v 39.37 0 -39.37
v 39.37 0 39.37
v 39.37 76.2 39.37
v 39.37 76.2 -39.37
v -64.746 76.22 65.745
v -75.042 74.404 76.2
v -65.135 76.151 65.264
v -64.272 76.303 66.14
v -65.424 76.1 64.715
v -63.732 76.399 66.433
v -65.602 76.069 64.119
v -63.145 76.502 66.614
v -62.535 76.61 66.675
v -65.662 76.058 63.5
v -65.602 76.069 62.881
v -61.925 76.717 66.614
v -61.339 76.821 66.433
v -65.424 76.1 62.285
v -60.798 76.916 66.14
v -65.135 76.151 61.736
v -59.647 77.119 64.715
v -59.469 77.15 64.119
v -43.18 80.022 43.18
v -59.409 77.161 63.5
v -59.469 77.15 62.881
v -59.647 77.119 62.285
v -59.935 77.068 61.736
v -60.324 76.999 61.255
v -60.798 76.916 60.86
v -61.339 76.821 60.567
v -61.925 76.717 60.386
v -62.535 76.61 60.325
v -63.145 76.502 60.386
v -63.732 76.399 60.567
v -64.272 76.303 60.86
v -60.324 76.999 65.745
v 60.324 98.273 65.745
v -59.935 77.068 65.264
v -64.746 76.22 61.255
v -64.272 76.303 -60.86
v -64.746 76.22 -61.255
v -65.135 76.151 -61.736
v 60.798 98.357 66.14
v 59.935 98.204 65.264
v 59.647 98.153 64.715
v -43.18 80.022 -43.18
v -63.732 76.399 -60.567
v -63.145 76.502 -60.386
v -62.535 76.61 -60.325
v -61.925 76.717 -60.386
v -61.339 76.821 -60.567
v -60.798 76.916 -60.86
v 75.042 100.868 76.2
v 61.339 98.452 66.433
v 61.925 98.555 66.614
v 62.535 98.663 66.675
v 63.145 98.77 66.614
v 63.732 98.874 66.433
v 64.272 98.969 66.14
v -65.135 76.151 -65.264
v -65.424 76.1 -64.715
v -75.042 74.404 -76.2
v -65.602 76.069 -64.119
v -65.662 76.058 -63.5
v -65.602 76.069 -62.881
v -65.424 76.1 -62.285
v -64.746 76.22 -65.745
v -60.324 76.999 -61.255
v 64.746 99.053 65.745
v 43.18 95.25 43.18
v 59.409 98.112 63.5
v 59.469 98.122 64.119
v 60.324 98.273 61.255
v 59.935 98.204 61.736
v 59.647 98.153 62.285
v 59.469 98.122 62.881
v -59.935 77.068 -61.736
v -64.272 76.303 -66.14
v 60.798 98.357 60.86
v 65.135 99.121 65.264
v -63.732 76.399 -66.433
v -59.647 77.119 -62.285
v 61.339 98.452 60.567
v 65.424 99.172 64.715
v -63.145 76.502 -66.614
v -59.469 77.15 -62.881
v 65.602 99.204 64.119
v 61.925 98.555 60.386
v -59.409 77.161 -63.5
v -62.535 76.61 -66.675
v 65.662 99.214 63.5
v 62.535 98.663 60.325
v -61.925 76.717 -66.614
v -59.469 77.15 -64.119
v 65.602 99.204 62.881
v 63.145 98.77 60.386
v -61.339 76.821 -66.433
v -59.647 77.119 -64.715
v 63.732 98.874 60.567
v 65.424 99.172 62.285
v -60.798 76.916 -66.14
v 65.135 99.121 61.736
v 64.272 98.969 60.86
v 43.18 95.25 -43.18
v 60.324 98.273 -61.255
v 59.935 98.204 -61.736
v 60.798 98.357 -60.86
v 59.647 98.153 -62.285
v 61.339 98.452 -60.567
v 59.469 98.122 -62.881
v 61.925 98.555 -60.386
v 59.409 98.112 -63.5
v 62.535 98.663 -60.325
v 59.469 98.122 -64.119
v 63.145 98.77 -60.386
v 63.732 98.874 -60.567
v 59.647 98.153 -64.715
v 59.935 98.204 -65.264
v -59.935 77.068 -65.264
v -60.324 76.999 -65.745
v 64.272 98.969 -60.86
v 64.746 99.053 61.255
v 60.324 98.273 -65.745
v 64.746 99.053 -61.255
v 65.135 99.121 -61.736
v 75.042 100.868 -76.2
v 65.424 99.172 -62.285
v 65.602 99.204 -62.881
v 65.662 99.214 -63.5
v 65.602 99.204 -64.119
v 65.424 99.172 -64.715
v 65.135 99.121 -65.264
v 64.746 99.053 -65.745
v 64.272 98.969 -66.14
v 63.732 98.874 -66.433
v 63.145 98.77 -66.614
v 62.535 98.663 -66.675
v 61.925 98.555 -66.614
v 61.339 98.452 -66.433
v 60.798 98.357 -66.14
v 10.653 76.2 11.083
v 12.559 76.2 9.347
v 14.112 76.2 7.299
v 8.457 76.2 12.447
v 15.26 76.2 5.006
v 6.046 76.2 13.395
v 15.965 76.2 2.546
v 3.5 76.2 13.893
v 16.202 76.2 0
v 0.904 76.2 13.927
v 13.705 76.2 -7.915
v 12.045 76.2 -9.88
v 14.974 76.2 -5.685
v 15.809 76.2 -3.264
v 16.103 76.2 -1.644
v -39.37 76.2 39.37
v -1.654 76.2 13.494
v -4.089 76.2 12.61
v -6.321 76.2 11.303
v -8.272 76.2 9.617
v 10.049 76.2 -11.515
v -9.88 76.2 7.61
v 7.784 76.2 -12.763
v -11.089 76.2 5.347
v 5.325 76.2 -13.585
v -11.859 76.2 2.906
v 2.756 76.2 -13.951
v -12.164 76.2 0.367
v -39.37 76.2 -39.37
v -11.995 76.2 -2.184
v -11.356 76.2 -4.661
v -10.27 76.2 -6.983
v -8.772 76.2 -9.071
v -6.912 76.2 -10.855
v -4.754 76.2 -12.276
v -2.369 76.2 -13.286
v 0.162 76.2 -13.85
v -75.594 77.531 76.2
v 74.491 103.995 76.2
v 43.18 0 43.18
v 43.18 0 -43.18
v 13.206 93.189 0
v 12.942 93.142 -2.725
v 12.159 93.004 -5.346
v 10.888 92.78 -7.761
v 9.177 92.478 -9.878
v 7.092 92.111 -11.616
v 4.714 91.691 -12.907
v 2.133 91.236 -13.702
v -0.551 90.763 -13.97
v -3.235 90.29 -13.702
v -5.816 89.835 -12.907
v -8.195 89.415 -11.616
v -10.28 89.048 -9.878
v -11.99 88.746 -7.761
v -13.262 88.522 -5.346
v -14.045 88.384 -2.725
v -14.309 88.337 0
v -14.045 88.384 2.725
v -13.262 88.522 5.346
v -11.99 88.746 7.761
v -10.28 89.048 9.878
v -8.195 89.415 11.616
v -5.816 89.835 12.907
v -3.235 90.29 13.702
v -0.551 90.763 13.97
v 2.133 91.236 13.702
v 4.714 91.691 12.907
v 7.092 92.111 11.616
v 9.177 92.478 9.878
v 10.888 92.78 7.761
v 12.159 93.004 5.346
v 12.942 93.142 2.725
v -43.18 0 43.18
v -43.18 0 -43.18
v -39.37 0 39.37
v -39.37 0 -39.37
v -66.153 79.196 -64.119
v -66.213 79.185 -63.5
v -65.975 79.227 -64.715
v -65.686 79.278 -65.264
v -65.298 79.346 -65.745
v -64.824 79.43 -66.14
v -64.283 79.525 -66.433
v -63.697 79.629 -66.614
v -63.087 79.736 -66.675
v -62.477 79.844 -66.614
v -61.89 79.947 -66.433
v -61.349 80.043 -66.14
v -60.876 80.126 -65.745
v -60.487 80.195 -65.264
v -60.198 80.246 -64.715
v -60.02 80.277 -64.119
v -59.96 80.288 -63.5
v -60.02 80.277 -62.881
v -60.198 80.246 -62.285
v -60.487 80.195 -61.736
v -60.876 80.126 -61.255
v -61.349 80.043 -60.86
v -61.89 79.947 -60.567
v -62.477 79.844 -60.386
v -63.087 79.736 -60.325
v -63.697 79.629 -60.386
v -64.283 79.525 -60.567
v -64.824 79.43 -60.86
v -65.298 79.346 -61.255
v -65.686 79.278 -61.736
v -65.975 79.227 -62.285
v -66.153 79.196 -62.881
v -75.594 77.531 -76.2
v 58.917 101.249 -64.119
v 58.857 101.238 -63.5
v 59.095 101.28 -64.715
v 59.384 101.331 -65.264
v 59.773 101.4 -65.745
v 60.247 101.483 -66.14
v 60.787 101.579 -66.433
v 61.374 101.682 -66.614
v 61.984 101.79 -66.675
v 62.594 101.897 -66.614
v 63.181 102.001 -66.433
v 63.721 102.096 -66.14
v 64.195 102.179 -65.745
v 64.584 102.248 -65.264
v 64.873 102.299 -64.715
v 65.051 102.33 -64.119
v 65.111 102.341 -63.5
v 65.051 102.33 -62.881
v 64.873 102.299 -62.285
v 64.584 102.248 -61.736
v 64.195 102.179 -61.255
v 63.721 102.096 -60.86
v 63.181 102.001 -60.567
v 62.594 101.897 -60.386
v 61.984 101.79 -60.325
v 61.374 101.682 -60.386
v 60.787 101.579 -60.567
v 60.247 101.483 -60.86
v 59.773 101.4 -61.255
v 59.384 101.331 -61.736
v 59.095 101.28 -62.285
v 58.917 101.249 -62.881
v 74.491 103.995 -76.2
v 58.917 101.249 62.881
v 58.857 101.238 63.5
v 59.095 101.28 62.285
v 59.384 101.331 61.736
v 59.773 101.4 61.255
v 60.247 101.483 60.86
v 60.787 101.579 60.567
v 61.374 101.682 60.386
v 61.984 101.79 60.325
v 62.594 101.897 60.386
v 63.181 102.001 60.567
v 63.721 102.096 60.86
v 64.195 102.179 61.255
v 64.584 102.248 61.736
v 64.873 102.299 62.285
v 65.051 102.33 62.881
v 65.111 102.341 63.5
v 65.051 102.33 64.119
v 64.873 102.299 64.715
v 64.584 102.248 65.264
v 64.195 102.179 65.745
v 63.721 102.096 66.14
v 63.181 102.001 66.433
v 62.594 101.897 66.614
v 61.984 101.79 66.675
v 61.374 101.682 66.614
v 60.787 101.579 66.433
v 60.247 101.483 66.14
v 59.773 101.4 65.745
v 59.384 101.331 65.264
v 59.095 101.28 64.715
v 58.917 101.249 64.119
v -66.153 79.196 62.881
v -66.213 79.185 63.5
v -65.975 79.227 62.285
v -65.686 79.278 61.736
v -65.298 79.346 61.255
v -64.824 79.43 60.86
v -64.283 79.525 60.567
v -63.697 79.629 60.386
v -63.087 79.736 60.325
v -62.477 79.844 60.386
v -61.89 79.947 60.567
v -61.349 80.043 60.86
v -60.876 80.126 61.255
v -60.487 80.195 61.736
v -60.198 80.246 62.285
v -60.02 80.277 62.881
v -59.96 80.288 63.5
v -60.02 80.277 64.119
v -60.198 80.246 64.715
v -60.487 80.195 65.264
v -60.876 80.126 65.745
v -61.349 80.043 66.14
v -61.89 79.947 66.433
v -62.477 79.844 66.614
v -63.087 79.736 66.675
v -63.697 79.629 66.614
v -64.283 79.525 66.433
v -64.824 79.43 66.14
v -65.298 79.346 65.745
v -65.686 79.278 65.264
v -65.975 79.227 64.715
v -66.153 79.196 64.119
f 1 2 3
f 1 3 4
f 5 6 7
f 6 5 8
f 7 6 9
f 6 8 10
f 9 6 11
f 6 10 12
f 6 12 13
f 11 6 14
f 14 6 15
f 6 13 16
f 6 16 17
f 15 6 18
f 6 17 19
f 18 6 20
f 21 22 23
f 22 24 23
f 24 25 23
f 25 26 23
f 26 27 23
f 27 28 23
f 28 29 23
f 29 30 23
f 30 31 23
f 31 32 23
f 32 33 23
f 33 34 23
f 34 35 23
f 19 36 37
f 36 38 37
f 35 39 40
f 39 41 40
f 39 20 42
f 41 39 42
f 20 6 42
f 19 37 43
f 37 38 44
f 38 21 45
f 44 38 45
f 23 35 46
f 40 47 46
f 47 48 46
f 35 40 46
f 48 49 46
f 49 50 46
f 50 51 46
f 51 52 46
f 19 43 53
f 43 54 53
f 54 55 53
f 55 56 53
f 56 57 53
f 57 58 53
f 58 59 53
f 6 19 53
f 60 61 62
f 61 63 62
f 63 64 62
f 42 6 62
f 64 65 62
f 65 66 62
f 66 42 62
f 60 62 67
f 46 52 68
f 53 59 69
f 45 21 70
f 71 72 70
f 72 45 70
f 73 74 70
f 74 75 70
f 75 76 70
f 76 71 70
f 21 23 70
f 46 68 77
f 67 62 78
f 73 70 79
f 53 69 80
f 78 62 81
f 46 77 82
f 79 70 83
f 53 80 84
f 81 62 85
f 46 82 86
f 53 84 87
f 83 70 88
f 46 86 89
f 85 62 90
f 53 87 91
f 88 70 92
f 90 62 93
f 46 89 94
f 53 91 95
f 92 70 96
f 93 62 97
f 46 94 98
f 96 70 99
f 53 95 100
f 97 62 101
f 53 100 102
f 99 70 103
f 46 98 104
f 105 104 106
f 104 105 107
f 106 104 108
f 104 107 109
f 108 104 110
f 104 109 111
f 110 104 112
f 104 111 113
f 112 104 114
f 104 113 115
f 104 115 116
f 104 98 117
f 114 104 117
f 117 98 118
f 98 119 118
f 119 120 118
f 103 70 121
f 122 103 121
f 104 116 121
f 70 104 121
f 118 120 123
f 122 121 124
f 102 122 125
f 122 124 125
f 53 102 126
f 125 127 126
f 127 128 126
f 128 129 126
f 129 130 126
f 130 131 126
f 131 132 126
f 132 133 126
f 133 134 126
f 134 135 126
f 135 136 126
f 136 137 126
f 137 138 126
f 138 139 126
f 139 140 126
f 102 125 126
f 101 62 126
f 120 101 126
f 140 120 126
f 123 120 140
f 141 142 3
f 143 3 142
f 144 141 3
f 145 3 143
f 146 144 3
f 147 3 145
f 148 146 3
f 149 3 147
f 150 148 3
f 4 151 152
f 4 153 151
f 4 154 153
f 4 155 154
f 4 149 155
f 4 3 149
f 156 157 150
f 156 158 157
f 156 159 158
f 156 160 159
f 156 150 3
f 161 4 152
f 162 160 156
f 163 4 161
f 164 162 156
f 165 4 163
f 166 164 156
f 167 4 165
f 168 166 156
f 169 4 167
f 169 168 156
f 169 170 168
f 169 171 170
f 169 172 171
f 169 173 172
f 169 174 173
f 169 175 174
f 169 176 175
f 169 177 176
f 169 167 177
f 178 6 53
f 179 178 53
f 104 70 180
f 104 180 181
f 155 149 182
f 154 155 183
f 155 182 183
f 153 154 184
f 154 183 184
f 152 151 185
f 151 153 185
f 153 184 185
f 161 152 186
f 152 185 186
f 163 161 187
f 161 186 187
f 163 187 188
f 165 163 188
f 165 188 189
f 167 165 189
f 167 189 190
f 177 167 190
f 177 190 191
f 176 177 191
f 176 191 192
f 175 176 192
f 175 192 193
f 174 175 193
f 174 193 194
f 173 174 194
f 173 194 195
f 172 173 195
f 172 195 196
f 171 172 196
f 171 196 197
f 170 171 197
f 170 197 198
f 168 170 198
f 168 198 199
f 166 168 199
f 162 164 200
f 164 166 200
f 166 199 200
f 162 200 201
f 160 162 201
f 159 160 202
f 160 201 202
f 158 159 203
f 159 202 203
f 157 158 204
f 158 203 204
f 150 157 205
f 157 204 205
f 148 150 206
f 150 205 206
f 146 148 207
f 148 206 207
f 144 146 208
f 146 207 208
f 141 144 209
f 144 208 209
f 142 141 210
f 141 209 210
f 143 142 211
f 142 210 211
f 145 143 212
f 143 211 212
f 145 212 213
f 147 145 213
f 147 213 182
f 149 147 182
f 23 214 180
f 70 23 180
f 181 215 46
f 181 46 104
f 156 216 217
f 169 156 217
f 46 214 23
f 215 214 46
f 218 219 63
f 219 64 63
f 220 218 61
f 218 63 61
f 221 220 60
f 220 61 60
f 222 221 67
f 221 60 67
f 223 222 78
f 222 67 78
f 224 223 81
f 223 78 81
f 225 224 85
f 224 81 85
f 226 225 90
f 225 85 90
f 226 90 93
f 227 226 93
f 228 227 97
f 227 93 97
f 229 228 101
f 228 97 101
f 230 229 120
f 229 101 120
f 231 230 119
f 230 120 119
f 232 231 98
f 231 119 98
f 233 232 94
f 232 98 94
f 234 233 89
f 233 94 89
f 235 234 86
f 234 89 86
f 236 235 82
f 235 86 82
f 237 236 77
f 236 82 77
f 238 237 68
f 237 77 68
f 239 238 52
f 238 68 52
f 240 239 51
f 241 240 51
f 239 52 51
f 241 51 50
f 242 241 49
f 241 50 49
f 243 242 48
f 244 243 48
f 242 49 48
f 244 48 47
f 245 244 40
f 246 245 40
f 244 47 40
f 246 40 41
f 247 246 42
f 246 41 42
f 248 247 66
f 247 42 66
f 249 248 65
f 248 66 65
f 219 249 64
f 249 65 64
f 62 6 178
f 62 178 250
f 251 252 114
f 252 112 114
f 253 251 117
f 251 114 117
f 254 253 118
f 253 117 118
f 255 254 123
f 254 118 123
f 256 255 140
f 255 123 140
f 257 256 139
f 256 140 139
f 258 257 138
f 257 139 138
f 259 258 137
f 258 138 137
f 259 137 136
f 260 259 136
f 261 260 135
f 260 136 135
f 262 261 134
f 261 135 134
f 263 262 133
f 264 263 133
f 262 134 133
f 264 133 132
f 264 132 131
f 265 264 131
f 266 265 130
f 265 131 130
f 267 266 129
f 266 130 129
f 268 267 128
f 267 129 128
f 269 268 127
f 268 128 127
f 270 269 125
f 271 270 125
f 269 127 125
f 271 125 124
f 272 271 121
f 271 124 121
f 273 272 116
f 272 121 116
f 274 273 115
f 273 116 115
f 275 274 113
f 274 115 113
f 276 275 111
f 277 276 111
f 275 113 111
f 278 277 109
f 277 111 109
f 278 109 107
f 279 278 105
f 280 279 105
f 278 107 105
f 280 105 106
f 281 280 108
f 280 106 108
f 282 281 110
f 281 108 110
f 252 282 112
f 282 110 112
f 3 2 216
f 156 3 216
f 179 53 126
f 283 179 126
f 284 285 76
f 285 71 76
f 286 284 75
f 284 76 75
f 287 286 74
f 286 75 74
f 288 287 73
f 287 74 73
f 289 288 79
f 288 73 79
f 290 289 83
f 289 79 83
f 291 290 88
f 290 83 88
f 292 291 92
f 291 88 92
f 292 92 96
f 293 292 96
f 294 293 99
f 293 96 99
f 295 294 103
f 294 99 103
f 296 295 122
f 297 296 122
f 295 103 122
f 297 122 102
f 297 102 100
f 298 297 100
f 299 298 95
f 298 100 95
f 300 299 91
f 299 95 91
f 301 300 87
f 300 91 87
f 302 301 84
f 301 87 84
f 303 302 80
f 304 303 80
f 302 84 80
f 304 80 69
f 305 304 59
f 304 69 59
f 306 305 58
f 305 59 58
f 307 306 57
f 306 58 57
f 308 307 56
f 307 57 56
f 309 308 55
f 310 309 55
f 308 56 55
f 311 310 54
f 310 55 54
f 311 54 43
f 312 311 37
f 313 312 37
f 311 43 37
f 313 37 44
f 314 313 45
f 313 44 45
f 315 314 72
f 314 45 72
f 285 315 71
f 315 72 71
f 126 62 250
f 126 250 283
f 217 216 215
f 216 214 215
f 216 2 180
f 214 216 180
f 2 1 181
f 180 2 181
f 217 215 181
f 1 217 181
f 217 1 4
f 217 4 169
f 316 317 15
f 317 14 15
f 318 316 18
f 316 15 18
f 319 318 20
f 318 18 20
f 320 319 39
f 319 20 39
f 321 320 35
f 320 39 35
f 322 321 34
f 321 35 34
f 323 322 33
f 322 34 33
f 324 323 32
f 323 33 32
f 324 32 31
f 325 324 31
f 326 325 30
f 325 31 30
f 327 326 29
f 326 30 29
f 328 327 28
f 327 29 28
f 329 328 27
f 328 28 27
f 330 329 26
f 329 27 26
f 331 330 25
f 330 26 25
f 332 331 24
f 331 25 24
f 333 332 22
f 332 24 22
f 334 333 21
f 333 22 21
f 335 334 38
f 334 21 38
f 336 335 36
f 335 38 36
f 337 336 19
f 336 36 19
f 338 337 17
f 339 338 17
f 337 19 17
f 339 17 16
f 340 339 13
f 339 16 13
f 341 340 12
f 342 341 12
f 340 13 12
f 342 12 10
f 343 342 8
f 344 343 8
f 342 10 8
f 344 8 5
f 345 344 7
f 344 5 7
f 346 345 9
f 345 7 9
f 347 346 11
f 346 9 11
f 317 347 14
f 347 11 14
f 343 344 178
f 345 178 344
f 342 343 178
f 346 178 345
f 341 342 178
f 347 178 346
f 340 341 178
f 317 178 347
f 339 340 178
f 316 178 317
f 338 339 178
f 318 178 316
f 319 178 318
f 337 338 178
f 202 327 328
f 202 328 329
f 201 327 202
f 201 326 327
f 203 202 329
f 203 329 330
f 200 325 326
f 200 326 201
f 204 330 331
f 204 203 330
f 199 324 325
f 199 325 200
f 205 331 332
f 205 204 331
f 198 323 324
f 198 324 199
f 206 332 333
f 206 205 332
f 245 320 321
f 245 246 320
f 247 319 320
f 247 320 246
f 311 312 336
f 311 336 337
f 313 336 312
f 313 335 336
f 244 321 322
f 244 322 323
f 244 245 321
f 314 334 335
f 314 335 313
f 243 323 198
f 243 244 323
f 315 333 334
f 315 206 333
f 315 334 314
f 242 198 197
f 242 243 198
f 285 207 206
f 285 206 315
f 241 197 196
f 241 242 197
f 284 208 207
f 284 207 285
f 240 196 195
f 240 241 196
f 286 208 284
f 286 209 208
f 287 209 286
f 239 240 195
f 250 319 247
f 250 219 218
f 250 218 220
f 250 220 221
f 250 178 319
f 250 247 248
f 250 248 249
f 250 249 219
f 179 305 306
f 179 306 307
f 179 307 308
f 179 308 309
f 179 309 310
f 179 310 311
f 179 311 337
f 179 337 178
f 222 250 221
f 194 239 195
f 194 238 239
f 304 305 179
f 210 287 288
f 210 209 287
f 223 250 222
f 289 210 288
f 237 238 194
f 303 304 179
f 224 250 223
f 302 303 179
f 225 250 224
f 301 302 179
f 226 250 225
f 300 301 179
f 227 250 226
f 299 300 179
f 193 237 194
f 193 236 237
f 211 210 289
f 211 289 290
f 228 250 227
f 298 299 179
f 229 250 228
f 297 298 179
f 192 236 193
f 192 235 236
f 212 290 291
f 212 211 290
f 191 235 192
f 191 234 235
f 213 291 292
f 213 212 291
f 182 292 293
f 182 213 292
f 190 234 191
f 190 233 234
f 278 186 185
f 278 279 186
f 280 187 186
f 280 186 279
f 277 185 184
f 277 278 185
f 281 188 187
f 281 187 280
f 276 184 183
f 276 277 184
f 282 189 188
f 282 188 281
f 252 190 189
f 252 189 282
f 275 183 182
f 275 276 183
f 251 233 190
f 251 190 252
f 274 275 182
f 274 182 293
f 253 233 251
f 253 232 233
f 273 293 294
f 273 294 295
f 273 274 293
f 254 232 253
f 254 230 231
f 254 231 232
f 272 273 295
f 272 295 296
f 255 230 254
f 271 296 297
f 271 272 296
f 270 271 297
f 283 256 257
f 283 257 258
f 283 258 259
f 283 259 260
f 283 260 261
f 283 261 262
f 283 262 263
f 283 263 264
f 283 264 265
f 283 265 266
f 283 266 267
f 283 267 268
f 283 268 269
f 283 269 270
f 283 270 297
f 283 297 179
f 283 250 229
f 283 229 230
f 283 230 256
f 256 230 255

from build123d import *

# Parameters (mm, degrees)
SKETCH1_W                       = 86.36
SKETCH1_H                       = 86.36
BOSS_EXTRUDE1_DEPTH             = 95.25
SKETCH2_W                       = 78.74
SKETCH2_H                       = 78.74
CUT_EXTRUDE1_DEPTH              = 76.2
CUT_EXTRUDE2_DEPTH              = 87.36
SKETCH7_W                       = 152.4
SKETCH7_H                       = 152.4
BOSS_EXTRUDE2_DEPTH             = 3.175
SKETCH9_R                       = 13.97
CUT_EXTRUDE4_DEPTH              = 103.510777623
F_1_4_0_25_DIAMETER_HOLE1_D     = 6.35
F_1_4_0_25_DIAMETER_HOLE1_DEPTH = 3.175
F_1_4_0_25_DIAMETER_HOLE1_TIP   = 1.907732465


with BuildPart() as part:
    # Sketch1 → Boss-Extrude1 (new body)
    with BuildSketch(Plane(origin=(0, 0, 0), x_dir=(1, 0, 0), z_dir=(0, 1, 0))):
        Rectangle(SKETCH1_W, SKETCH1_H)
    extrude(amount=BOSS_EXTRUDE1_DEPTH)

    # Sketch2 → Cut-Extrude1 (cut)
    with BuildSketch(Plane(origin=(0, 0, 0), x_dir=(-1, 0, 0), z_dir=(0, -1, 0))):
        Rectangle(SKETCH2_W, SKETCH2_H)
    extrude(amount=-CUT_EXTRUDE1_DEPTH, mode=Mode.SUBTRACT)

    # Sketch4 → Cut-Extrude2 (cut, through all)
    with BuildSketch(Plane(origin=(0, 0, -43.18), x_dir=(-1, 0, 0), z_dir=(0, 0, -1))):
        Polygon((-43.18, 95.25), (43.18, 80.022401946), (43.18, 95.25), align=None)
    extrude(amount=-CUT_EXTRUDE2_DEPTH, mode=Mode.SUBTRACT)

    # Sketch7 → Boss-Extrude2 (add)
    with BuildSketch(Plane(origin=(-14.986673009, 84.993646171, 0), x_dir=(0.984807753, 0.173648178, 0), z_dir=(-0.173648178, 0.984807753, 0))):
        with Locations((15.217866597, 0)):
            Rectangle(SKETCH7_W, SKETCH7_H)
    extrude(amount=BOSS_EXTRUDE2_DEPTH)

    # Sketch9 → Cut-Extrude4 (cut, through all)
    with BuildSketch(Plane(origin=(-15.538005973, 88.120410786, 0), x_dir=(0.984807753, 0.173648178, 0), z_dir=(-0.173648178, 0.984807753, 0))):
        with Locations((15.217866597, 0)):
            Circle(SKETCH9_R)
    extrude(amount=-CUT_EXTRUDE4_DEPTH, mode=Mode.SUBTRACT)

    # 1/4 (0.25) Diameter Hole1
    with Locations(Plane(origin=(-15.538005973, 88.120410786, 0), x_dir=(0.984807753, 0.173648178, 0), z_dir=(-0.173648178, 0.984807753, 0))):
        with Locations((-48.282133403, 63.5), (78.717866597, 63.5), (78.717866597, -63.5), (-48.282133403, -63.5)):
            Hole(F_1_4_0_25_DIAMETER_HOLE1_D / 2, depth=F_1_4_0_25_DIAMETER_HOLE1_DEPTH)
            with Locations((0, 0, -(F_1_4_0_25_DIAMETER_HOLE1_DEPTH + F_1_4_0_25_DIAMETER_HOLE1_TIP / 2))):  # 118° drill point
                Cone(0, F_1_4_0_25_DIAMETER_HOLE1_D / 2, F_1_4_0_25_DIAMETER_HOLE1_TIP, mode=Mode.SUBTRACT)


solid = part.part
